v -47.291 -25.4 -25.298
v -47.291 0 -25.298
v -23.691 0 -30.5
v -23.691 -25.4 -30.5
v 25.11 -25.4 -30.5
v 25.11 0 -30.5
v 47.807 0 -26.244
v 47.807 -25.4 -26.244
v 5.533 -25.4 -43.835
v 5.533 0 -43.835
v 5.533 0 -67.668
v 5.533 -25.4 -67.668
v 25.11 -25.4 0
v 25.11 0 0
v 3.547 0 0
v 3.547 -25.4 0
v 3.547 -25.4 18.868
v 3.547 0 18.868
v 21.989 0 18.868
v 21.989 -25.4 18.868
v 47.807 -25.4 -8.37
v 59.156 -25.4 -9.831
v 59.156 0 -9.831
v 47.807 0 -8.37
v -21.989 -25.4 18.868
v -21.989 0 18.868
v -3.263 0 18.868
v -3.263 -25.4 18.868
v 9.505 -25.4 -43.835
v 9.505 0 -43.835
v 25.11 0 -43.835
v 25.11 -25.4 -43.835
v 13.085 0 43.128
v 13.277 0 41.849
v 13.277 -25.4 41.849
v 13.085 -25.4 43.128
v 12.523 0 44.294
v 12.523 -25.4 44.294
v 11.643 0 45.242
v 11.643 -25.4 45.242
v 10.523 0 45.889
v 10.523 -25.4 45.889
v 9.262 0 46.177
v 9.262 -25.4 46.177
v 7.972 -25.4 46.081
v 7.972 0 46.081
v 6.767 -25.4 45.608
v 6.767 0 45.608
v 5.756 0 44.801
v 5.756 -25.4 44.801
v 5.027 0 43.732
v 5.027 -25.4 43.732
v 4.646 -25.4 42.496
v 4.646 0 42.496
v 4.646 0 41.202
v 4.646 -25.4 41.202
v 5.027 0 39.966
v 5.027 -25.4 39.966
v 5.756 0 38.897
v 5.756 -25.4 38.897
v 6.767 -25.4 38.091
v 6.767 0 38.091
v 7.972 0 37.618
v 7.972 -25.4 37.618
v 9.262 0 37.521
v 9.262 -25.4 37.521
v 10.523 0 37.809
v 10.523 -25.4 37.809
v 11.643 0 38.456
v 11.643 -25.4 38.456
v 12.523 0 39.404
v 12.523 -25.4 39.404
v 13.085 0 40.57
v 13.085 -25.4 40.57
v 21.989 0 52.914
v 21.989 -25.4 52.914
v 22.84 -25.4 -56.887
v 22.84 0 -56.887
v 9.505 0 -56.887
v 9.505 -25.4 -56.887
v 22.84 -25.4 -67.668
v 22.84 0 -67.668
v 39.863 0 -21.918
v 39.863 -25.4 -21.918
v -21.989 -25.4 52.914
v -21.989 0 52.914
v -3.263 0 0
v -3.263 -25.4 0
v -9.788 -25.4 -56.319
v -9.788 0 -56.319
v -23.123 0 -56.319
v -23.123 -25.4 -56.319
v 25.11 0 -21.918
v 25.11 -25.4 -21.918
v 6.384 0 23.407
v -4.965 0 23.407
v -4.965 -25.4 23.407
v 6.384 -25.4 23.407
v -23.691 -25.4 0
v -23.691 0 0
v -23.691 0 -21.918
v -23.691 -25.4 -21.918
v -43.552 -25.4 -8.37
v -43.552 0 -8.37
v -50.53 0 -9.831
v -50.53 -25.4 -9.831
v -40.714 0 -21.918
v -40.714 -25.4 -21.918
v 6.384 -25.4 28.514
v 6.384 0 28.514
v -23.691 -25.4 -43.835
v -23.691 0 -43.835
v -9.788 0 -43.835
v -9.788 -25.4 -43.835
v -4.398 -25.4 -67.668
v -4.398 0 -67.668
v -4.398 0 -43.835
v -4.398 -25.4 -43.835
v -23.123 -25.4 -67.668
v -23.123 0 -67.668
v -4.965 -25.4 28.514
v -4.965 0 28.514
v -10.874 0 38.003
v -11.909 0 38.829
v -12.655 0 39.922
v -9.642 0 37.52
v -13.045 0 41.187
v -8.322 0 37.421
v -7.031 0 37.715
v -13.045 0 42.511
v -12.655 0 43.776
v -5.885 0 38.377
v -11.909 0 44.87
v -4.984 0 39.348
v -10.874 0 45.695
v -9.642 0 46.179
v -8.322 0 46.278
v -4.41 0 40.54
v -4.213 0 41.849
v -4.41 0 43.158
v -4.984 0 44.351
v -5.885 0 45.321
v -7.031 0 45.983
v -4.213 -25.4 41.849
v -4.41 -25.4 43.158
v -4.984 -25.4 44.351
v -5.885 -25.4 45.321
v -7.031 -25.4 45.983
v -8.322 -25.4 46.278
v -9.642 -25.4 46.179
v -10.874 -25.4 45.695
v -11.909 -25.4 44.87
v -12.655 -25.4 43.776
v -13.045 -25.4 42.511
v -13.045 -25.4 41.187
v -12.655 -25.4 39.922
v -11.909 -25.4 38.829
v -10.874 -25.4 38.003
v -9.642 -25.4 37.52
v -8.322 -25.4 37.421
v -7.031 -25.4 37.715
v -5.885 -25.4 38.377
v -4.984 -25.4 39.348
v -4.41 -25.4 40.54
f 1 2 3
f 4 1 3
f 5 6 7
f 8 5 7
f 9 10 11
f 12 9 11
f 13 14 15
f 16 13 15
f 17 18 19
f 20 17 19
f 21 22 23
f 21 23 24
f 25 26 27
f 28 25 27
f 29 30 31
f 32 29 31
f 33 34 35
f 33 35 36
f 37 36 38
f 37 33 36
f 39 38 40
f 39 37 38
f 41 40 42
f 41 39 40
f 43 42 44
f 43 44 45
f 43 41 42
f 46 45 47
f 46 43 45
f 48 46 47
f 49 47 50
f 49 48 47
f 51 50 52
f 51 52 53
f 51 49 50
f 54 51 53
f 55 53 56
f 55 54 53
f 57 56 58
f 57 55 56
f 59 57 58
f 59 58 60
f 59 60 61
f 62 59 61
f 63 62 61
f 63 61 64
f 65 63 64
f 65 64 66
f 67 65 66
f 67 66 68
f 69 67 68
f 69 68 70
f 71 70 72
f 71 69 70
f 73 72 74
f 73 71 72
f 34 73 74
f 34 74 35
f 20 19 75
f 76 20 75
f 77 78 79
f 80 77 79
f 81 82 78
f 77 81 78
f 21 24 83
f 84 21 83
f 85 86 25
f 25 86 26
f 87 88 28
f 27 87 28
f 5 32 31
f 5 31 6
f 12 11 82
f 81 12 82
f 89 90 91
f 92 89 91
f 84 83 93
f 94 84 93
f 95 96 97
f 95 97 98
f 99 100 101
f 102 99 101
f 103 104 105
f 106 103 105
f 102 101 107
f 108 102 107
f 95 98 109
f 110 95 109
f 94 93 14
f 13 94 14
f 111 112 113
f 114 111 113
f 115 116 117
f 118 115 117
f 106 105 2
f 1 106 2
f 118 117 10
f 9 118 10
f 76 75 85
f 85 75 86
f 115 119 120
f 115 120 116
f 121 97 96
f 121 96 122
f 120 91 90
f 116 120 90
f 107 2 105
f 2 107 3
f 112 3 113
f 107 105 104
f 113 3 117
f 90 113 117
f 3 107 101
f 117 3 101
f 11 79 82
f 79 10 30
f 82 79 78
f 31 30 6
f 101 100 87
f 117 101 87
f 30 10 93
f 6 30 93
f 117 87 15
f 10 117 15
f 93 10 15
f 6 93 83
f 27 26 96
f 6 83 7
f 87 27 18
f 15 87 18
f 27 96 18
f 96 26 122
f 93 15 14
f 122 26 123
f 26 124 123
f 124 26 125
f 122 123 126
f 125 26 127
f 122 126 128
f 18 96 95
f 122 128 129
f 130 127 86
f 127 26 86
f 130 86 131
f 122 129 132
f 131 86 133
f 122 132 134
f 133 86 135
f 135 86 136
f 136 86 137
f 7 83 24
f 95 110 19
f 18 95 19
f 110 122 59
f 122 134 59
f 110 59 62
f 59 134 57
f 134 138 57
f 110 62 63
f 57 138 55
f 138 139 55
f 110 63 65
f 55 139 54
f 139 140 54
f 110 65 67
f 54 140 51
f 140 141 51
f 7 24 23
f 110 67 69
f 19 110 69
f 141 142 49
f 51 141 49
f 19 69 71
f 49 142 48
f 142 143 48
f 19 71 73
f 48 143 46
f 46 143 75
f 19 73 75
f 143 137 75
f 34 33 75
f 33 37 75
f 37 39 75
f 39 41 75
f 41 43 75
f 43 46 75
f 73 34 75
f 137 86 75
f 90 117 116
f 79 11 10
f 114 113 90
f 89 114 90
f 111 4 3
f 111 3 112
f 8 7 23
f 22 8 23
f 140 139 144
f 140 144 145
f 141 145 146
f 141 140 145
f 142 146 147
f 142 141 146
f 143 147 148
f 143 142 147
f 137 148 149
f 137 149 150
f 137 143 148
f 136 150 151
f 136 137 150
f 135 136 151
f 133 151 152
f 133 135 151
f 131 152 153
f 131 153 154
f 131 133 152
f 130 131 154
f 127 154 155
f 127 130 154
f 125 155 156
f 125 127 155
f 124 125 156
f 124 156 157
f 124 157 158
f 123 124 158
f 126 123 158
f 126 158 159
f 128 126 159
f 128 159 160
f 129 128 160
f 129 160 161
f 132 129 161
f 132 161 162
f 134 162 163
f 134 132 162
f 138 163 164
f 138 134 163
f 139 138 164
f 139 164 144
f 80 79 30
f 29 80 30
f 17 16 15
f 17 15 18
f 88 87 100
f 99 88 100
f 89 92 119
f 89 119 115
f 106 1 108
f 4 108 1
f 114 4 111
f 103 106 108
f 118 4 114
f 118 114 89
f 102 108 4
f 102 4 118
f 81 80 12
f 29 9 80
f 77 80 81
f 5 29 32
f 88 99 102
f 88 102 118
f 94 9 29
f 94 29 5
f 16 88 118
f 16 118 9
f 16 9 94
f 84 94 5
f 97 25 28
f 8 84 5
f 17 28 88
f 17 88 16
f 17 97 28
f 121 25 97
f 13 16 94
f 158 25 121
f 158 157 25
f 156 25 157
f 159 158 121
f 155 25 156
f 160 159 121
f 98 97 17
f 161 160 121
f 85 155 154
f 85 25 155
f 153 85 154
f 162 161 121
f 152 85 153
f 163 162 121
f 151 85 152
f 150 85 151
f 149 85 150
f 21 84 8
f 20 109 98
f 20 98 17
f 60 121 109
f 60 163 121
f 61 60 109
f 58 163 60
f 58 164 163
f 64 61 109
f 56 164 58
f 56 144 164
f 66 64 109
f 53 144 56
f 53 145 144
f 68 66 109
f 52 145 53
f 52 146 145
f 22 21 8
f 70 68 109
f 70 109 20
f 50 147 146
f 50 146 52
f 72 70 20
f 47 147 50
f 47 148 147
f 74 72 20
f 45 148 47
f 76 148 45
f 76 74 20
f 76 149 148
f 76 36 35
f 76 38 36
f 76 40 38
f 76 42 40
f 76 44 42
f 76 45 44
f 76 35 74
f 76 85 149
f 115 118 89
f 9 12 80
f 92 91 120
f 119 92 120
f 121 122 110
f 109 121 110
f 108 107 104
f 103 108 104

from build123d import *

# Parameters (mm, degrees)
F0_W     = 11.348937
F0_H     = 5.107021
F0_R     = 4.440973
F0_R_2   = 4.340135
F0_W_2   = 6.809362
F0_H_2   = 18.867606
F1_DEPTH = 25.4


with BuildPart() as f1:
    # F0 (on Front) → F1 (new body)
    with BuildSketch(Plane.XZ):
        Polygon((21.988563, 52.914415), (-21.988565, 52.914415), (-21.988565, 18.867606), (-3.262819, 18.867606), (3.546543, 18.867606), (21.988563, 18.867606), align=None)
        with Locations((0.709308, 25.96069)):
            Rectangle(F0_W, F0_H, mode=Mode.SUBTRACT)
        with Locations((-8.653564, 41.849203)):
            Circle(F0_R, mode=Mode.SUBTRACT)
        with Locations((8.937287, 41.849203)):
            Circle(F0_R_2, mode=Mode.SUBTRACT)
        with Locations((0.141862, 9.433803)):
            Rectangle(F0_W_2, F0_H_2)
        Polygon((3.546543, 0), (-3.262819, 0), (-23.690904, 0), (-23.690904, -21.917634), (-23.690904, -30.500267), (-23.690904, -43.835267), (-9.788458, -43.835267), (-4.397713, -43.835267), (5.532607, -43.835267), (9.504734, -43.835267), (25.10952, -43.835267), (25.10952, -30.500267), (25.10952, -21.917634), (25.10952, 0), align=None)
        Polygon((-23.690904, -30.500267), (-23.690904, -21.917634), (-40.714309, -21.917634), (-43.551542, -8.369841), (-50.530179, -9.831335), (-47.290991, -25.298465), align=None)
        Polygon((39.863139, -21.917634), (25.10952, -21.917634), (25.10952, -30.500267), (47.807392, -26.244417), (59.156332, -9.831335), (47.807392, -8.369841), align=None)
        Polygon((-4.397713, -43.835267), (-9.788458, -43.835267), (-9.788458, -56.319095), (-23.123458, -56.319095), (-23.123458, -67.668028), (-4.397713, -67.668028), align=None)
        Polygon((9.504734, -56.886546), (9.504734, -43.835267), (5.532607, -43.835267), (5.532607, -67.668028), (22.839734, -67.668028), (22.839734, -56.886546), align=None)
    extrude(amount=F1_DEPTH)


solid = f1.part
